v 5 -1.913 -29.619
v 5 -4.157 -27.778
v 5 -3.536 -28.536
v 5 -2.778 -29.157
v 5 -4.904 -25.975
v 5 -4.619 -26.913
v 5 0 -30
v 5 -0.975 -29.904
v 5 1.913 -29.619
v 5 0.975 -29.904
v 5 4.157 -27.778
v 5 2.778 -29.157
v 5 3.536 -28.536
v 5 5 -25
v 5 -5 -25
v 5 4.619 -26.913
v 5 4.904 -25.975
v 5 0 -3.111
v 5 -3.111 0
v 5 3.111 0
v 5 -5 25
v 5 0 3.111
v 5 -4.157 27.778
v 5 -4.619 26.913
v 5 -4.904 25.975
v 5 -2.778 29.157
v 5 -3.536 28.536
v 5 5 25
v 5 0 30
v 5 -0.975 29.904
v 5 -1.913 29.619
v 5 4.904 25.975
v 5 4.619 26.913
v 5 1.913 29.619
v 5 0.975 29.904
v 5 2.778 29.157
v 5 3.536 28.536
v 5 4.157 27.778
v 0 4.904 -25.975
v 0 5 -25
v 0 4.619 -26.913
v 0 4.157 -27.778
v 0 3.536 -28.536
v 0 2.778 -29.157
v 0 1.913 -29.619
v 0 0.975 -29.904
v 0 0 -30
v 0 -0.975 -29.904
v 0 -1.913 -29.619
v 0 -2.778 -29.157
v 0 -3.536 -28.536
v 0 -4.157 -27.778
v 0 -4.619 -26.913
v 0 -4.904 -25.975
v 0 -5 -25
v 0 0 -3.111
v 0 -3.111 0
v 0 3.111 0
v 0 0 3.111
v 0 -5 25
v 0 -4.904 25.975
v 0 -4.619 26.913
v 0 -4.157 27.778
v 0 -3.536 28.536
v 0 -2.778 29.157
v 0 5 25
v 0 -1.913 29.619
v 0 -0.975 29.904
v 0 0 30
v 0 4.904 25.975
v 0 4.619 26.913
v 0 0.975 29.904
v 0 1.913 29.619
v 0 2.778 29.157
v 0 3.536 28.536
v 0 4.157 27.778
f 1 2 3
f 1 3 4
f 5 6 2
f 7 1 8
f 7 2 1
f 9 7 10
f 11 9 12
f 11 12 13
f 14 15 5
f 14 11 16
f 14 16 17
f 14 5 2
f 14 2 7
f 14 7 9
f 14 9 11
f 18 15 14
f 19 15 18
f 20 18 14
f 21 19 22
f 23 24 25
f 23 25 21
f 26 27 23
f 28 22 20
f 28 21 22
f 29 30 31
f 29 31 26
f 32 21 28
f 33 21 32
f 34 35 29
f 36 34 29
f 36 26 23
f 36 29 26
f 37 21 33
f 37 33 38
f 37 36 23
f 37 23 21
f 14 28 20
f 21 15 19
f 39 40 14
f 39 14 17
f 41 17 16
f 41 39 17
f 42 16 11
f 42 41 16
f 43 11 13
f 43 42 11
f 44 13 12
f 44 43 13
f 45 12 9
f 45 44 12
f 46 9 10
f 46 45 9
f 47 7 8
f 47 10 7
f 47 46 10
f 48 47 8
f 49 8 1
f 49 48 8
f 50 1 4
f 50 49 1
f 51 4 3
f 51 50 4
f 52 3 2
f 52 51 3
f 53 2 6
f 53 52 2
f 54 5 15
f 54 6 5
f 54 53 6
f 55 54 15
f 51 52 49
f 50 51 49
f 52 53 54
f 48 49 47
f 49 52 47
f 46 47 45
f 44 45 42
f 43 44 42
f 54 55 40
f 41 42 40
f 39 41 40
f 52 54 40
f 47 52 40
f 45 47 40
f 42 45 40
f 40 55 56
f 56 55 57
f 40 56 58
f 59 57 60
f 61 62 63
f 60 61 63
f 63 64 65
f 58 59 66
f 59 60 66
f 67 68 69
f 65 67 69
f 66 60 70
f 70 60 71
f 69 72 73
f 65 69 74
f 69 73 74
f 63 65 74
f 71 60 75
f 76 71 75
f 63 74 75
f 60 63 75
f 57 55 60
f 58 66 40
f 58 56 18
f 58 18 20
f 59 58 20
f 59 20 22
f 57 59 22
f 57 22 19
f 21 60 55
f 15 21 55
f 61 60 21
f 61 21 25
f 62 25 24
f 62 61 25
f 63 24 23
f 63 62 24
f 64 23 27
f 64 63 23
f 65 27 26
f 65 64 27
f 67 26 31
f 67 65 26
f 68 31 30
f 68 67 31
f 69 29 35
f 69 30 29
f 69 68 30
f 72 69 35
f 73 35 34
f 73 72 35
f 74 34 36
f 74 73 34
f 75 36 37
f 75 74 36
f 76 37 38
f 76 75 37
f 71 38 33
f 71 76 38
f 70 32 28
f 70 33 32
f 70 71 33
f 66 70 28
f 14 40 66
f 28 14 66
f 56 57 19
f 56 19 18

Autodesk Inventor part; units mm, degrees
ref_plane "YZ Plane" through (0, 0, 0) normal (1, 0, 0) x (0, 1, 0)
ref_plane "XZ Plane" through (0, 0, 0) normal (0, 1, 0) x (-1, 0, 0)
ref_plane "XY Plane" through (0, 0, 0) normal (0, 0, 1) x (1, 0, 0)
sketch "스케치1" plane through (0, 0, 0) normal (1, 0, 0) x (0, 1, 0)
  line L0 (0, 25) -> (0, -25) construction
  line L1 (-5, 25) -> (-5, -25)
  line L2 (5, -25) -> (5, 25)
  arc A0 (5, 25) -> (-5, 25) centre (0, 25) ccw
  arc A1 (-5, -25) -> (5, -25) centre (0, -25) ccw
  line L3 (0, 3.1113) -> (-3.1113, 0)
  line L4 (-3.1113, 0) -> (0, -3.1113)
  line L5 (0, -3.1113) -> (3.1113, 0)
  line L6 (3.1113, 0) -> (0, 3.1113)
  point P0 (0, 0)
  point P1 (0, 0)
  dimension "d0" = 50
  dimension "d1" = 5
  dimension "d2" = 4.4
extrude "돌출1" add sketch "스케치1" along normal blind 5
properties part number "lever_handle"
